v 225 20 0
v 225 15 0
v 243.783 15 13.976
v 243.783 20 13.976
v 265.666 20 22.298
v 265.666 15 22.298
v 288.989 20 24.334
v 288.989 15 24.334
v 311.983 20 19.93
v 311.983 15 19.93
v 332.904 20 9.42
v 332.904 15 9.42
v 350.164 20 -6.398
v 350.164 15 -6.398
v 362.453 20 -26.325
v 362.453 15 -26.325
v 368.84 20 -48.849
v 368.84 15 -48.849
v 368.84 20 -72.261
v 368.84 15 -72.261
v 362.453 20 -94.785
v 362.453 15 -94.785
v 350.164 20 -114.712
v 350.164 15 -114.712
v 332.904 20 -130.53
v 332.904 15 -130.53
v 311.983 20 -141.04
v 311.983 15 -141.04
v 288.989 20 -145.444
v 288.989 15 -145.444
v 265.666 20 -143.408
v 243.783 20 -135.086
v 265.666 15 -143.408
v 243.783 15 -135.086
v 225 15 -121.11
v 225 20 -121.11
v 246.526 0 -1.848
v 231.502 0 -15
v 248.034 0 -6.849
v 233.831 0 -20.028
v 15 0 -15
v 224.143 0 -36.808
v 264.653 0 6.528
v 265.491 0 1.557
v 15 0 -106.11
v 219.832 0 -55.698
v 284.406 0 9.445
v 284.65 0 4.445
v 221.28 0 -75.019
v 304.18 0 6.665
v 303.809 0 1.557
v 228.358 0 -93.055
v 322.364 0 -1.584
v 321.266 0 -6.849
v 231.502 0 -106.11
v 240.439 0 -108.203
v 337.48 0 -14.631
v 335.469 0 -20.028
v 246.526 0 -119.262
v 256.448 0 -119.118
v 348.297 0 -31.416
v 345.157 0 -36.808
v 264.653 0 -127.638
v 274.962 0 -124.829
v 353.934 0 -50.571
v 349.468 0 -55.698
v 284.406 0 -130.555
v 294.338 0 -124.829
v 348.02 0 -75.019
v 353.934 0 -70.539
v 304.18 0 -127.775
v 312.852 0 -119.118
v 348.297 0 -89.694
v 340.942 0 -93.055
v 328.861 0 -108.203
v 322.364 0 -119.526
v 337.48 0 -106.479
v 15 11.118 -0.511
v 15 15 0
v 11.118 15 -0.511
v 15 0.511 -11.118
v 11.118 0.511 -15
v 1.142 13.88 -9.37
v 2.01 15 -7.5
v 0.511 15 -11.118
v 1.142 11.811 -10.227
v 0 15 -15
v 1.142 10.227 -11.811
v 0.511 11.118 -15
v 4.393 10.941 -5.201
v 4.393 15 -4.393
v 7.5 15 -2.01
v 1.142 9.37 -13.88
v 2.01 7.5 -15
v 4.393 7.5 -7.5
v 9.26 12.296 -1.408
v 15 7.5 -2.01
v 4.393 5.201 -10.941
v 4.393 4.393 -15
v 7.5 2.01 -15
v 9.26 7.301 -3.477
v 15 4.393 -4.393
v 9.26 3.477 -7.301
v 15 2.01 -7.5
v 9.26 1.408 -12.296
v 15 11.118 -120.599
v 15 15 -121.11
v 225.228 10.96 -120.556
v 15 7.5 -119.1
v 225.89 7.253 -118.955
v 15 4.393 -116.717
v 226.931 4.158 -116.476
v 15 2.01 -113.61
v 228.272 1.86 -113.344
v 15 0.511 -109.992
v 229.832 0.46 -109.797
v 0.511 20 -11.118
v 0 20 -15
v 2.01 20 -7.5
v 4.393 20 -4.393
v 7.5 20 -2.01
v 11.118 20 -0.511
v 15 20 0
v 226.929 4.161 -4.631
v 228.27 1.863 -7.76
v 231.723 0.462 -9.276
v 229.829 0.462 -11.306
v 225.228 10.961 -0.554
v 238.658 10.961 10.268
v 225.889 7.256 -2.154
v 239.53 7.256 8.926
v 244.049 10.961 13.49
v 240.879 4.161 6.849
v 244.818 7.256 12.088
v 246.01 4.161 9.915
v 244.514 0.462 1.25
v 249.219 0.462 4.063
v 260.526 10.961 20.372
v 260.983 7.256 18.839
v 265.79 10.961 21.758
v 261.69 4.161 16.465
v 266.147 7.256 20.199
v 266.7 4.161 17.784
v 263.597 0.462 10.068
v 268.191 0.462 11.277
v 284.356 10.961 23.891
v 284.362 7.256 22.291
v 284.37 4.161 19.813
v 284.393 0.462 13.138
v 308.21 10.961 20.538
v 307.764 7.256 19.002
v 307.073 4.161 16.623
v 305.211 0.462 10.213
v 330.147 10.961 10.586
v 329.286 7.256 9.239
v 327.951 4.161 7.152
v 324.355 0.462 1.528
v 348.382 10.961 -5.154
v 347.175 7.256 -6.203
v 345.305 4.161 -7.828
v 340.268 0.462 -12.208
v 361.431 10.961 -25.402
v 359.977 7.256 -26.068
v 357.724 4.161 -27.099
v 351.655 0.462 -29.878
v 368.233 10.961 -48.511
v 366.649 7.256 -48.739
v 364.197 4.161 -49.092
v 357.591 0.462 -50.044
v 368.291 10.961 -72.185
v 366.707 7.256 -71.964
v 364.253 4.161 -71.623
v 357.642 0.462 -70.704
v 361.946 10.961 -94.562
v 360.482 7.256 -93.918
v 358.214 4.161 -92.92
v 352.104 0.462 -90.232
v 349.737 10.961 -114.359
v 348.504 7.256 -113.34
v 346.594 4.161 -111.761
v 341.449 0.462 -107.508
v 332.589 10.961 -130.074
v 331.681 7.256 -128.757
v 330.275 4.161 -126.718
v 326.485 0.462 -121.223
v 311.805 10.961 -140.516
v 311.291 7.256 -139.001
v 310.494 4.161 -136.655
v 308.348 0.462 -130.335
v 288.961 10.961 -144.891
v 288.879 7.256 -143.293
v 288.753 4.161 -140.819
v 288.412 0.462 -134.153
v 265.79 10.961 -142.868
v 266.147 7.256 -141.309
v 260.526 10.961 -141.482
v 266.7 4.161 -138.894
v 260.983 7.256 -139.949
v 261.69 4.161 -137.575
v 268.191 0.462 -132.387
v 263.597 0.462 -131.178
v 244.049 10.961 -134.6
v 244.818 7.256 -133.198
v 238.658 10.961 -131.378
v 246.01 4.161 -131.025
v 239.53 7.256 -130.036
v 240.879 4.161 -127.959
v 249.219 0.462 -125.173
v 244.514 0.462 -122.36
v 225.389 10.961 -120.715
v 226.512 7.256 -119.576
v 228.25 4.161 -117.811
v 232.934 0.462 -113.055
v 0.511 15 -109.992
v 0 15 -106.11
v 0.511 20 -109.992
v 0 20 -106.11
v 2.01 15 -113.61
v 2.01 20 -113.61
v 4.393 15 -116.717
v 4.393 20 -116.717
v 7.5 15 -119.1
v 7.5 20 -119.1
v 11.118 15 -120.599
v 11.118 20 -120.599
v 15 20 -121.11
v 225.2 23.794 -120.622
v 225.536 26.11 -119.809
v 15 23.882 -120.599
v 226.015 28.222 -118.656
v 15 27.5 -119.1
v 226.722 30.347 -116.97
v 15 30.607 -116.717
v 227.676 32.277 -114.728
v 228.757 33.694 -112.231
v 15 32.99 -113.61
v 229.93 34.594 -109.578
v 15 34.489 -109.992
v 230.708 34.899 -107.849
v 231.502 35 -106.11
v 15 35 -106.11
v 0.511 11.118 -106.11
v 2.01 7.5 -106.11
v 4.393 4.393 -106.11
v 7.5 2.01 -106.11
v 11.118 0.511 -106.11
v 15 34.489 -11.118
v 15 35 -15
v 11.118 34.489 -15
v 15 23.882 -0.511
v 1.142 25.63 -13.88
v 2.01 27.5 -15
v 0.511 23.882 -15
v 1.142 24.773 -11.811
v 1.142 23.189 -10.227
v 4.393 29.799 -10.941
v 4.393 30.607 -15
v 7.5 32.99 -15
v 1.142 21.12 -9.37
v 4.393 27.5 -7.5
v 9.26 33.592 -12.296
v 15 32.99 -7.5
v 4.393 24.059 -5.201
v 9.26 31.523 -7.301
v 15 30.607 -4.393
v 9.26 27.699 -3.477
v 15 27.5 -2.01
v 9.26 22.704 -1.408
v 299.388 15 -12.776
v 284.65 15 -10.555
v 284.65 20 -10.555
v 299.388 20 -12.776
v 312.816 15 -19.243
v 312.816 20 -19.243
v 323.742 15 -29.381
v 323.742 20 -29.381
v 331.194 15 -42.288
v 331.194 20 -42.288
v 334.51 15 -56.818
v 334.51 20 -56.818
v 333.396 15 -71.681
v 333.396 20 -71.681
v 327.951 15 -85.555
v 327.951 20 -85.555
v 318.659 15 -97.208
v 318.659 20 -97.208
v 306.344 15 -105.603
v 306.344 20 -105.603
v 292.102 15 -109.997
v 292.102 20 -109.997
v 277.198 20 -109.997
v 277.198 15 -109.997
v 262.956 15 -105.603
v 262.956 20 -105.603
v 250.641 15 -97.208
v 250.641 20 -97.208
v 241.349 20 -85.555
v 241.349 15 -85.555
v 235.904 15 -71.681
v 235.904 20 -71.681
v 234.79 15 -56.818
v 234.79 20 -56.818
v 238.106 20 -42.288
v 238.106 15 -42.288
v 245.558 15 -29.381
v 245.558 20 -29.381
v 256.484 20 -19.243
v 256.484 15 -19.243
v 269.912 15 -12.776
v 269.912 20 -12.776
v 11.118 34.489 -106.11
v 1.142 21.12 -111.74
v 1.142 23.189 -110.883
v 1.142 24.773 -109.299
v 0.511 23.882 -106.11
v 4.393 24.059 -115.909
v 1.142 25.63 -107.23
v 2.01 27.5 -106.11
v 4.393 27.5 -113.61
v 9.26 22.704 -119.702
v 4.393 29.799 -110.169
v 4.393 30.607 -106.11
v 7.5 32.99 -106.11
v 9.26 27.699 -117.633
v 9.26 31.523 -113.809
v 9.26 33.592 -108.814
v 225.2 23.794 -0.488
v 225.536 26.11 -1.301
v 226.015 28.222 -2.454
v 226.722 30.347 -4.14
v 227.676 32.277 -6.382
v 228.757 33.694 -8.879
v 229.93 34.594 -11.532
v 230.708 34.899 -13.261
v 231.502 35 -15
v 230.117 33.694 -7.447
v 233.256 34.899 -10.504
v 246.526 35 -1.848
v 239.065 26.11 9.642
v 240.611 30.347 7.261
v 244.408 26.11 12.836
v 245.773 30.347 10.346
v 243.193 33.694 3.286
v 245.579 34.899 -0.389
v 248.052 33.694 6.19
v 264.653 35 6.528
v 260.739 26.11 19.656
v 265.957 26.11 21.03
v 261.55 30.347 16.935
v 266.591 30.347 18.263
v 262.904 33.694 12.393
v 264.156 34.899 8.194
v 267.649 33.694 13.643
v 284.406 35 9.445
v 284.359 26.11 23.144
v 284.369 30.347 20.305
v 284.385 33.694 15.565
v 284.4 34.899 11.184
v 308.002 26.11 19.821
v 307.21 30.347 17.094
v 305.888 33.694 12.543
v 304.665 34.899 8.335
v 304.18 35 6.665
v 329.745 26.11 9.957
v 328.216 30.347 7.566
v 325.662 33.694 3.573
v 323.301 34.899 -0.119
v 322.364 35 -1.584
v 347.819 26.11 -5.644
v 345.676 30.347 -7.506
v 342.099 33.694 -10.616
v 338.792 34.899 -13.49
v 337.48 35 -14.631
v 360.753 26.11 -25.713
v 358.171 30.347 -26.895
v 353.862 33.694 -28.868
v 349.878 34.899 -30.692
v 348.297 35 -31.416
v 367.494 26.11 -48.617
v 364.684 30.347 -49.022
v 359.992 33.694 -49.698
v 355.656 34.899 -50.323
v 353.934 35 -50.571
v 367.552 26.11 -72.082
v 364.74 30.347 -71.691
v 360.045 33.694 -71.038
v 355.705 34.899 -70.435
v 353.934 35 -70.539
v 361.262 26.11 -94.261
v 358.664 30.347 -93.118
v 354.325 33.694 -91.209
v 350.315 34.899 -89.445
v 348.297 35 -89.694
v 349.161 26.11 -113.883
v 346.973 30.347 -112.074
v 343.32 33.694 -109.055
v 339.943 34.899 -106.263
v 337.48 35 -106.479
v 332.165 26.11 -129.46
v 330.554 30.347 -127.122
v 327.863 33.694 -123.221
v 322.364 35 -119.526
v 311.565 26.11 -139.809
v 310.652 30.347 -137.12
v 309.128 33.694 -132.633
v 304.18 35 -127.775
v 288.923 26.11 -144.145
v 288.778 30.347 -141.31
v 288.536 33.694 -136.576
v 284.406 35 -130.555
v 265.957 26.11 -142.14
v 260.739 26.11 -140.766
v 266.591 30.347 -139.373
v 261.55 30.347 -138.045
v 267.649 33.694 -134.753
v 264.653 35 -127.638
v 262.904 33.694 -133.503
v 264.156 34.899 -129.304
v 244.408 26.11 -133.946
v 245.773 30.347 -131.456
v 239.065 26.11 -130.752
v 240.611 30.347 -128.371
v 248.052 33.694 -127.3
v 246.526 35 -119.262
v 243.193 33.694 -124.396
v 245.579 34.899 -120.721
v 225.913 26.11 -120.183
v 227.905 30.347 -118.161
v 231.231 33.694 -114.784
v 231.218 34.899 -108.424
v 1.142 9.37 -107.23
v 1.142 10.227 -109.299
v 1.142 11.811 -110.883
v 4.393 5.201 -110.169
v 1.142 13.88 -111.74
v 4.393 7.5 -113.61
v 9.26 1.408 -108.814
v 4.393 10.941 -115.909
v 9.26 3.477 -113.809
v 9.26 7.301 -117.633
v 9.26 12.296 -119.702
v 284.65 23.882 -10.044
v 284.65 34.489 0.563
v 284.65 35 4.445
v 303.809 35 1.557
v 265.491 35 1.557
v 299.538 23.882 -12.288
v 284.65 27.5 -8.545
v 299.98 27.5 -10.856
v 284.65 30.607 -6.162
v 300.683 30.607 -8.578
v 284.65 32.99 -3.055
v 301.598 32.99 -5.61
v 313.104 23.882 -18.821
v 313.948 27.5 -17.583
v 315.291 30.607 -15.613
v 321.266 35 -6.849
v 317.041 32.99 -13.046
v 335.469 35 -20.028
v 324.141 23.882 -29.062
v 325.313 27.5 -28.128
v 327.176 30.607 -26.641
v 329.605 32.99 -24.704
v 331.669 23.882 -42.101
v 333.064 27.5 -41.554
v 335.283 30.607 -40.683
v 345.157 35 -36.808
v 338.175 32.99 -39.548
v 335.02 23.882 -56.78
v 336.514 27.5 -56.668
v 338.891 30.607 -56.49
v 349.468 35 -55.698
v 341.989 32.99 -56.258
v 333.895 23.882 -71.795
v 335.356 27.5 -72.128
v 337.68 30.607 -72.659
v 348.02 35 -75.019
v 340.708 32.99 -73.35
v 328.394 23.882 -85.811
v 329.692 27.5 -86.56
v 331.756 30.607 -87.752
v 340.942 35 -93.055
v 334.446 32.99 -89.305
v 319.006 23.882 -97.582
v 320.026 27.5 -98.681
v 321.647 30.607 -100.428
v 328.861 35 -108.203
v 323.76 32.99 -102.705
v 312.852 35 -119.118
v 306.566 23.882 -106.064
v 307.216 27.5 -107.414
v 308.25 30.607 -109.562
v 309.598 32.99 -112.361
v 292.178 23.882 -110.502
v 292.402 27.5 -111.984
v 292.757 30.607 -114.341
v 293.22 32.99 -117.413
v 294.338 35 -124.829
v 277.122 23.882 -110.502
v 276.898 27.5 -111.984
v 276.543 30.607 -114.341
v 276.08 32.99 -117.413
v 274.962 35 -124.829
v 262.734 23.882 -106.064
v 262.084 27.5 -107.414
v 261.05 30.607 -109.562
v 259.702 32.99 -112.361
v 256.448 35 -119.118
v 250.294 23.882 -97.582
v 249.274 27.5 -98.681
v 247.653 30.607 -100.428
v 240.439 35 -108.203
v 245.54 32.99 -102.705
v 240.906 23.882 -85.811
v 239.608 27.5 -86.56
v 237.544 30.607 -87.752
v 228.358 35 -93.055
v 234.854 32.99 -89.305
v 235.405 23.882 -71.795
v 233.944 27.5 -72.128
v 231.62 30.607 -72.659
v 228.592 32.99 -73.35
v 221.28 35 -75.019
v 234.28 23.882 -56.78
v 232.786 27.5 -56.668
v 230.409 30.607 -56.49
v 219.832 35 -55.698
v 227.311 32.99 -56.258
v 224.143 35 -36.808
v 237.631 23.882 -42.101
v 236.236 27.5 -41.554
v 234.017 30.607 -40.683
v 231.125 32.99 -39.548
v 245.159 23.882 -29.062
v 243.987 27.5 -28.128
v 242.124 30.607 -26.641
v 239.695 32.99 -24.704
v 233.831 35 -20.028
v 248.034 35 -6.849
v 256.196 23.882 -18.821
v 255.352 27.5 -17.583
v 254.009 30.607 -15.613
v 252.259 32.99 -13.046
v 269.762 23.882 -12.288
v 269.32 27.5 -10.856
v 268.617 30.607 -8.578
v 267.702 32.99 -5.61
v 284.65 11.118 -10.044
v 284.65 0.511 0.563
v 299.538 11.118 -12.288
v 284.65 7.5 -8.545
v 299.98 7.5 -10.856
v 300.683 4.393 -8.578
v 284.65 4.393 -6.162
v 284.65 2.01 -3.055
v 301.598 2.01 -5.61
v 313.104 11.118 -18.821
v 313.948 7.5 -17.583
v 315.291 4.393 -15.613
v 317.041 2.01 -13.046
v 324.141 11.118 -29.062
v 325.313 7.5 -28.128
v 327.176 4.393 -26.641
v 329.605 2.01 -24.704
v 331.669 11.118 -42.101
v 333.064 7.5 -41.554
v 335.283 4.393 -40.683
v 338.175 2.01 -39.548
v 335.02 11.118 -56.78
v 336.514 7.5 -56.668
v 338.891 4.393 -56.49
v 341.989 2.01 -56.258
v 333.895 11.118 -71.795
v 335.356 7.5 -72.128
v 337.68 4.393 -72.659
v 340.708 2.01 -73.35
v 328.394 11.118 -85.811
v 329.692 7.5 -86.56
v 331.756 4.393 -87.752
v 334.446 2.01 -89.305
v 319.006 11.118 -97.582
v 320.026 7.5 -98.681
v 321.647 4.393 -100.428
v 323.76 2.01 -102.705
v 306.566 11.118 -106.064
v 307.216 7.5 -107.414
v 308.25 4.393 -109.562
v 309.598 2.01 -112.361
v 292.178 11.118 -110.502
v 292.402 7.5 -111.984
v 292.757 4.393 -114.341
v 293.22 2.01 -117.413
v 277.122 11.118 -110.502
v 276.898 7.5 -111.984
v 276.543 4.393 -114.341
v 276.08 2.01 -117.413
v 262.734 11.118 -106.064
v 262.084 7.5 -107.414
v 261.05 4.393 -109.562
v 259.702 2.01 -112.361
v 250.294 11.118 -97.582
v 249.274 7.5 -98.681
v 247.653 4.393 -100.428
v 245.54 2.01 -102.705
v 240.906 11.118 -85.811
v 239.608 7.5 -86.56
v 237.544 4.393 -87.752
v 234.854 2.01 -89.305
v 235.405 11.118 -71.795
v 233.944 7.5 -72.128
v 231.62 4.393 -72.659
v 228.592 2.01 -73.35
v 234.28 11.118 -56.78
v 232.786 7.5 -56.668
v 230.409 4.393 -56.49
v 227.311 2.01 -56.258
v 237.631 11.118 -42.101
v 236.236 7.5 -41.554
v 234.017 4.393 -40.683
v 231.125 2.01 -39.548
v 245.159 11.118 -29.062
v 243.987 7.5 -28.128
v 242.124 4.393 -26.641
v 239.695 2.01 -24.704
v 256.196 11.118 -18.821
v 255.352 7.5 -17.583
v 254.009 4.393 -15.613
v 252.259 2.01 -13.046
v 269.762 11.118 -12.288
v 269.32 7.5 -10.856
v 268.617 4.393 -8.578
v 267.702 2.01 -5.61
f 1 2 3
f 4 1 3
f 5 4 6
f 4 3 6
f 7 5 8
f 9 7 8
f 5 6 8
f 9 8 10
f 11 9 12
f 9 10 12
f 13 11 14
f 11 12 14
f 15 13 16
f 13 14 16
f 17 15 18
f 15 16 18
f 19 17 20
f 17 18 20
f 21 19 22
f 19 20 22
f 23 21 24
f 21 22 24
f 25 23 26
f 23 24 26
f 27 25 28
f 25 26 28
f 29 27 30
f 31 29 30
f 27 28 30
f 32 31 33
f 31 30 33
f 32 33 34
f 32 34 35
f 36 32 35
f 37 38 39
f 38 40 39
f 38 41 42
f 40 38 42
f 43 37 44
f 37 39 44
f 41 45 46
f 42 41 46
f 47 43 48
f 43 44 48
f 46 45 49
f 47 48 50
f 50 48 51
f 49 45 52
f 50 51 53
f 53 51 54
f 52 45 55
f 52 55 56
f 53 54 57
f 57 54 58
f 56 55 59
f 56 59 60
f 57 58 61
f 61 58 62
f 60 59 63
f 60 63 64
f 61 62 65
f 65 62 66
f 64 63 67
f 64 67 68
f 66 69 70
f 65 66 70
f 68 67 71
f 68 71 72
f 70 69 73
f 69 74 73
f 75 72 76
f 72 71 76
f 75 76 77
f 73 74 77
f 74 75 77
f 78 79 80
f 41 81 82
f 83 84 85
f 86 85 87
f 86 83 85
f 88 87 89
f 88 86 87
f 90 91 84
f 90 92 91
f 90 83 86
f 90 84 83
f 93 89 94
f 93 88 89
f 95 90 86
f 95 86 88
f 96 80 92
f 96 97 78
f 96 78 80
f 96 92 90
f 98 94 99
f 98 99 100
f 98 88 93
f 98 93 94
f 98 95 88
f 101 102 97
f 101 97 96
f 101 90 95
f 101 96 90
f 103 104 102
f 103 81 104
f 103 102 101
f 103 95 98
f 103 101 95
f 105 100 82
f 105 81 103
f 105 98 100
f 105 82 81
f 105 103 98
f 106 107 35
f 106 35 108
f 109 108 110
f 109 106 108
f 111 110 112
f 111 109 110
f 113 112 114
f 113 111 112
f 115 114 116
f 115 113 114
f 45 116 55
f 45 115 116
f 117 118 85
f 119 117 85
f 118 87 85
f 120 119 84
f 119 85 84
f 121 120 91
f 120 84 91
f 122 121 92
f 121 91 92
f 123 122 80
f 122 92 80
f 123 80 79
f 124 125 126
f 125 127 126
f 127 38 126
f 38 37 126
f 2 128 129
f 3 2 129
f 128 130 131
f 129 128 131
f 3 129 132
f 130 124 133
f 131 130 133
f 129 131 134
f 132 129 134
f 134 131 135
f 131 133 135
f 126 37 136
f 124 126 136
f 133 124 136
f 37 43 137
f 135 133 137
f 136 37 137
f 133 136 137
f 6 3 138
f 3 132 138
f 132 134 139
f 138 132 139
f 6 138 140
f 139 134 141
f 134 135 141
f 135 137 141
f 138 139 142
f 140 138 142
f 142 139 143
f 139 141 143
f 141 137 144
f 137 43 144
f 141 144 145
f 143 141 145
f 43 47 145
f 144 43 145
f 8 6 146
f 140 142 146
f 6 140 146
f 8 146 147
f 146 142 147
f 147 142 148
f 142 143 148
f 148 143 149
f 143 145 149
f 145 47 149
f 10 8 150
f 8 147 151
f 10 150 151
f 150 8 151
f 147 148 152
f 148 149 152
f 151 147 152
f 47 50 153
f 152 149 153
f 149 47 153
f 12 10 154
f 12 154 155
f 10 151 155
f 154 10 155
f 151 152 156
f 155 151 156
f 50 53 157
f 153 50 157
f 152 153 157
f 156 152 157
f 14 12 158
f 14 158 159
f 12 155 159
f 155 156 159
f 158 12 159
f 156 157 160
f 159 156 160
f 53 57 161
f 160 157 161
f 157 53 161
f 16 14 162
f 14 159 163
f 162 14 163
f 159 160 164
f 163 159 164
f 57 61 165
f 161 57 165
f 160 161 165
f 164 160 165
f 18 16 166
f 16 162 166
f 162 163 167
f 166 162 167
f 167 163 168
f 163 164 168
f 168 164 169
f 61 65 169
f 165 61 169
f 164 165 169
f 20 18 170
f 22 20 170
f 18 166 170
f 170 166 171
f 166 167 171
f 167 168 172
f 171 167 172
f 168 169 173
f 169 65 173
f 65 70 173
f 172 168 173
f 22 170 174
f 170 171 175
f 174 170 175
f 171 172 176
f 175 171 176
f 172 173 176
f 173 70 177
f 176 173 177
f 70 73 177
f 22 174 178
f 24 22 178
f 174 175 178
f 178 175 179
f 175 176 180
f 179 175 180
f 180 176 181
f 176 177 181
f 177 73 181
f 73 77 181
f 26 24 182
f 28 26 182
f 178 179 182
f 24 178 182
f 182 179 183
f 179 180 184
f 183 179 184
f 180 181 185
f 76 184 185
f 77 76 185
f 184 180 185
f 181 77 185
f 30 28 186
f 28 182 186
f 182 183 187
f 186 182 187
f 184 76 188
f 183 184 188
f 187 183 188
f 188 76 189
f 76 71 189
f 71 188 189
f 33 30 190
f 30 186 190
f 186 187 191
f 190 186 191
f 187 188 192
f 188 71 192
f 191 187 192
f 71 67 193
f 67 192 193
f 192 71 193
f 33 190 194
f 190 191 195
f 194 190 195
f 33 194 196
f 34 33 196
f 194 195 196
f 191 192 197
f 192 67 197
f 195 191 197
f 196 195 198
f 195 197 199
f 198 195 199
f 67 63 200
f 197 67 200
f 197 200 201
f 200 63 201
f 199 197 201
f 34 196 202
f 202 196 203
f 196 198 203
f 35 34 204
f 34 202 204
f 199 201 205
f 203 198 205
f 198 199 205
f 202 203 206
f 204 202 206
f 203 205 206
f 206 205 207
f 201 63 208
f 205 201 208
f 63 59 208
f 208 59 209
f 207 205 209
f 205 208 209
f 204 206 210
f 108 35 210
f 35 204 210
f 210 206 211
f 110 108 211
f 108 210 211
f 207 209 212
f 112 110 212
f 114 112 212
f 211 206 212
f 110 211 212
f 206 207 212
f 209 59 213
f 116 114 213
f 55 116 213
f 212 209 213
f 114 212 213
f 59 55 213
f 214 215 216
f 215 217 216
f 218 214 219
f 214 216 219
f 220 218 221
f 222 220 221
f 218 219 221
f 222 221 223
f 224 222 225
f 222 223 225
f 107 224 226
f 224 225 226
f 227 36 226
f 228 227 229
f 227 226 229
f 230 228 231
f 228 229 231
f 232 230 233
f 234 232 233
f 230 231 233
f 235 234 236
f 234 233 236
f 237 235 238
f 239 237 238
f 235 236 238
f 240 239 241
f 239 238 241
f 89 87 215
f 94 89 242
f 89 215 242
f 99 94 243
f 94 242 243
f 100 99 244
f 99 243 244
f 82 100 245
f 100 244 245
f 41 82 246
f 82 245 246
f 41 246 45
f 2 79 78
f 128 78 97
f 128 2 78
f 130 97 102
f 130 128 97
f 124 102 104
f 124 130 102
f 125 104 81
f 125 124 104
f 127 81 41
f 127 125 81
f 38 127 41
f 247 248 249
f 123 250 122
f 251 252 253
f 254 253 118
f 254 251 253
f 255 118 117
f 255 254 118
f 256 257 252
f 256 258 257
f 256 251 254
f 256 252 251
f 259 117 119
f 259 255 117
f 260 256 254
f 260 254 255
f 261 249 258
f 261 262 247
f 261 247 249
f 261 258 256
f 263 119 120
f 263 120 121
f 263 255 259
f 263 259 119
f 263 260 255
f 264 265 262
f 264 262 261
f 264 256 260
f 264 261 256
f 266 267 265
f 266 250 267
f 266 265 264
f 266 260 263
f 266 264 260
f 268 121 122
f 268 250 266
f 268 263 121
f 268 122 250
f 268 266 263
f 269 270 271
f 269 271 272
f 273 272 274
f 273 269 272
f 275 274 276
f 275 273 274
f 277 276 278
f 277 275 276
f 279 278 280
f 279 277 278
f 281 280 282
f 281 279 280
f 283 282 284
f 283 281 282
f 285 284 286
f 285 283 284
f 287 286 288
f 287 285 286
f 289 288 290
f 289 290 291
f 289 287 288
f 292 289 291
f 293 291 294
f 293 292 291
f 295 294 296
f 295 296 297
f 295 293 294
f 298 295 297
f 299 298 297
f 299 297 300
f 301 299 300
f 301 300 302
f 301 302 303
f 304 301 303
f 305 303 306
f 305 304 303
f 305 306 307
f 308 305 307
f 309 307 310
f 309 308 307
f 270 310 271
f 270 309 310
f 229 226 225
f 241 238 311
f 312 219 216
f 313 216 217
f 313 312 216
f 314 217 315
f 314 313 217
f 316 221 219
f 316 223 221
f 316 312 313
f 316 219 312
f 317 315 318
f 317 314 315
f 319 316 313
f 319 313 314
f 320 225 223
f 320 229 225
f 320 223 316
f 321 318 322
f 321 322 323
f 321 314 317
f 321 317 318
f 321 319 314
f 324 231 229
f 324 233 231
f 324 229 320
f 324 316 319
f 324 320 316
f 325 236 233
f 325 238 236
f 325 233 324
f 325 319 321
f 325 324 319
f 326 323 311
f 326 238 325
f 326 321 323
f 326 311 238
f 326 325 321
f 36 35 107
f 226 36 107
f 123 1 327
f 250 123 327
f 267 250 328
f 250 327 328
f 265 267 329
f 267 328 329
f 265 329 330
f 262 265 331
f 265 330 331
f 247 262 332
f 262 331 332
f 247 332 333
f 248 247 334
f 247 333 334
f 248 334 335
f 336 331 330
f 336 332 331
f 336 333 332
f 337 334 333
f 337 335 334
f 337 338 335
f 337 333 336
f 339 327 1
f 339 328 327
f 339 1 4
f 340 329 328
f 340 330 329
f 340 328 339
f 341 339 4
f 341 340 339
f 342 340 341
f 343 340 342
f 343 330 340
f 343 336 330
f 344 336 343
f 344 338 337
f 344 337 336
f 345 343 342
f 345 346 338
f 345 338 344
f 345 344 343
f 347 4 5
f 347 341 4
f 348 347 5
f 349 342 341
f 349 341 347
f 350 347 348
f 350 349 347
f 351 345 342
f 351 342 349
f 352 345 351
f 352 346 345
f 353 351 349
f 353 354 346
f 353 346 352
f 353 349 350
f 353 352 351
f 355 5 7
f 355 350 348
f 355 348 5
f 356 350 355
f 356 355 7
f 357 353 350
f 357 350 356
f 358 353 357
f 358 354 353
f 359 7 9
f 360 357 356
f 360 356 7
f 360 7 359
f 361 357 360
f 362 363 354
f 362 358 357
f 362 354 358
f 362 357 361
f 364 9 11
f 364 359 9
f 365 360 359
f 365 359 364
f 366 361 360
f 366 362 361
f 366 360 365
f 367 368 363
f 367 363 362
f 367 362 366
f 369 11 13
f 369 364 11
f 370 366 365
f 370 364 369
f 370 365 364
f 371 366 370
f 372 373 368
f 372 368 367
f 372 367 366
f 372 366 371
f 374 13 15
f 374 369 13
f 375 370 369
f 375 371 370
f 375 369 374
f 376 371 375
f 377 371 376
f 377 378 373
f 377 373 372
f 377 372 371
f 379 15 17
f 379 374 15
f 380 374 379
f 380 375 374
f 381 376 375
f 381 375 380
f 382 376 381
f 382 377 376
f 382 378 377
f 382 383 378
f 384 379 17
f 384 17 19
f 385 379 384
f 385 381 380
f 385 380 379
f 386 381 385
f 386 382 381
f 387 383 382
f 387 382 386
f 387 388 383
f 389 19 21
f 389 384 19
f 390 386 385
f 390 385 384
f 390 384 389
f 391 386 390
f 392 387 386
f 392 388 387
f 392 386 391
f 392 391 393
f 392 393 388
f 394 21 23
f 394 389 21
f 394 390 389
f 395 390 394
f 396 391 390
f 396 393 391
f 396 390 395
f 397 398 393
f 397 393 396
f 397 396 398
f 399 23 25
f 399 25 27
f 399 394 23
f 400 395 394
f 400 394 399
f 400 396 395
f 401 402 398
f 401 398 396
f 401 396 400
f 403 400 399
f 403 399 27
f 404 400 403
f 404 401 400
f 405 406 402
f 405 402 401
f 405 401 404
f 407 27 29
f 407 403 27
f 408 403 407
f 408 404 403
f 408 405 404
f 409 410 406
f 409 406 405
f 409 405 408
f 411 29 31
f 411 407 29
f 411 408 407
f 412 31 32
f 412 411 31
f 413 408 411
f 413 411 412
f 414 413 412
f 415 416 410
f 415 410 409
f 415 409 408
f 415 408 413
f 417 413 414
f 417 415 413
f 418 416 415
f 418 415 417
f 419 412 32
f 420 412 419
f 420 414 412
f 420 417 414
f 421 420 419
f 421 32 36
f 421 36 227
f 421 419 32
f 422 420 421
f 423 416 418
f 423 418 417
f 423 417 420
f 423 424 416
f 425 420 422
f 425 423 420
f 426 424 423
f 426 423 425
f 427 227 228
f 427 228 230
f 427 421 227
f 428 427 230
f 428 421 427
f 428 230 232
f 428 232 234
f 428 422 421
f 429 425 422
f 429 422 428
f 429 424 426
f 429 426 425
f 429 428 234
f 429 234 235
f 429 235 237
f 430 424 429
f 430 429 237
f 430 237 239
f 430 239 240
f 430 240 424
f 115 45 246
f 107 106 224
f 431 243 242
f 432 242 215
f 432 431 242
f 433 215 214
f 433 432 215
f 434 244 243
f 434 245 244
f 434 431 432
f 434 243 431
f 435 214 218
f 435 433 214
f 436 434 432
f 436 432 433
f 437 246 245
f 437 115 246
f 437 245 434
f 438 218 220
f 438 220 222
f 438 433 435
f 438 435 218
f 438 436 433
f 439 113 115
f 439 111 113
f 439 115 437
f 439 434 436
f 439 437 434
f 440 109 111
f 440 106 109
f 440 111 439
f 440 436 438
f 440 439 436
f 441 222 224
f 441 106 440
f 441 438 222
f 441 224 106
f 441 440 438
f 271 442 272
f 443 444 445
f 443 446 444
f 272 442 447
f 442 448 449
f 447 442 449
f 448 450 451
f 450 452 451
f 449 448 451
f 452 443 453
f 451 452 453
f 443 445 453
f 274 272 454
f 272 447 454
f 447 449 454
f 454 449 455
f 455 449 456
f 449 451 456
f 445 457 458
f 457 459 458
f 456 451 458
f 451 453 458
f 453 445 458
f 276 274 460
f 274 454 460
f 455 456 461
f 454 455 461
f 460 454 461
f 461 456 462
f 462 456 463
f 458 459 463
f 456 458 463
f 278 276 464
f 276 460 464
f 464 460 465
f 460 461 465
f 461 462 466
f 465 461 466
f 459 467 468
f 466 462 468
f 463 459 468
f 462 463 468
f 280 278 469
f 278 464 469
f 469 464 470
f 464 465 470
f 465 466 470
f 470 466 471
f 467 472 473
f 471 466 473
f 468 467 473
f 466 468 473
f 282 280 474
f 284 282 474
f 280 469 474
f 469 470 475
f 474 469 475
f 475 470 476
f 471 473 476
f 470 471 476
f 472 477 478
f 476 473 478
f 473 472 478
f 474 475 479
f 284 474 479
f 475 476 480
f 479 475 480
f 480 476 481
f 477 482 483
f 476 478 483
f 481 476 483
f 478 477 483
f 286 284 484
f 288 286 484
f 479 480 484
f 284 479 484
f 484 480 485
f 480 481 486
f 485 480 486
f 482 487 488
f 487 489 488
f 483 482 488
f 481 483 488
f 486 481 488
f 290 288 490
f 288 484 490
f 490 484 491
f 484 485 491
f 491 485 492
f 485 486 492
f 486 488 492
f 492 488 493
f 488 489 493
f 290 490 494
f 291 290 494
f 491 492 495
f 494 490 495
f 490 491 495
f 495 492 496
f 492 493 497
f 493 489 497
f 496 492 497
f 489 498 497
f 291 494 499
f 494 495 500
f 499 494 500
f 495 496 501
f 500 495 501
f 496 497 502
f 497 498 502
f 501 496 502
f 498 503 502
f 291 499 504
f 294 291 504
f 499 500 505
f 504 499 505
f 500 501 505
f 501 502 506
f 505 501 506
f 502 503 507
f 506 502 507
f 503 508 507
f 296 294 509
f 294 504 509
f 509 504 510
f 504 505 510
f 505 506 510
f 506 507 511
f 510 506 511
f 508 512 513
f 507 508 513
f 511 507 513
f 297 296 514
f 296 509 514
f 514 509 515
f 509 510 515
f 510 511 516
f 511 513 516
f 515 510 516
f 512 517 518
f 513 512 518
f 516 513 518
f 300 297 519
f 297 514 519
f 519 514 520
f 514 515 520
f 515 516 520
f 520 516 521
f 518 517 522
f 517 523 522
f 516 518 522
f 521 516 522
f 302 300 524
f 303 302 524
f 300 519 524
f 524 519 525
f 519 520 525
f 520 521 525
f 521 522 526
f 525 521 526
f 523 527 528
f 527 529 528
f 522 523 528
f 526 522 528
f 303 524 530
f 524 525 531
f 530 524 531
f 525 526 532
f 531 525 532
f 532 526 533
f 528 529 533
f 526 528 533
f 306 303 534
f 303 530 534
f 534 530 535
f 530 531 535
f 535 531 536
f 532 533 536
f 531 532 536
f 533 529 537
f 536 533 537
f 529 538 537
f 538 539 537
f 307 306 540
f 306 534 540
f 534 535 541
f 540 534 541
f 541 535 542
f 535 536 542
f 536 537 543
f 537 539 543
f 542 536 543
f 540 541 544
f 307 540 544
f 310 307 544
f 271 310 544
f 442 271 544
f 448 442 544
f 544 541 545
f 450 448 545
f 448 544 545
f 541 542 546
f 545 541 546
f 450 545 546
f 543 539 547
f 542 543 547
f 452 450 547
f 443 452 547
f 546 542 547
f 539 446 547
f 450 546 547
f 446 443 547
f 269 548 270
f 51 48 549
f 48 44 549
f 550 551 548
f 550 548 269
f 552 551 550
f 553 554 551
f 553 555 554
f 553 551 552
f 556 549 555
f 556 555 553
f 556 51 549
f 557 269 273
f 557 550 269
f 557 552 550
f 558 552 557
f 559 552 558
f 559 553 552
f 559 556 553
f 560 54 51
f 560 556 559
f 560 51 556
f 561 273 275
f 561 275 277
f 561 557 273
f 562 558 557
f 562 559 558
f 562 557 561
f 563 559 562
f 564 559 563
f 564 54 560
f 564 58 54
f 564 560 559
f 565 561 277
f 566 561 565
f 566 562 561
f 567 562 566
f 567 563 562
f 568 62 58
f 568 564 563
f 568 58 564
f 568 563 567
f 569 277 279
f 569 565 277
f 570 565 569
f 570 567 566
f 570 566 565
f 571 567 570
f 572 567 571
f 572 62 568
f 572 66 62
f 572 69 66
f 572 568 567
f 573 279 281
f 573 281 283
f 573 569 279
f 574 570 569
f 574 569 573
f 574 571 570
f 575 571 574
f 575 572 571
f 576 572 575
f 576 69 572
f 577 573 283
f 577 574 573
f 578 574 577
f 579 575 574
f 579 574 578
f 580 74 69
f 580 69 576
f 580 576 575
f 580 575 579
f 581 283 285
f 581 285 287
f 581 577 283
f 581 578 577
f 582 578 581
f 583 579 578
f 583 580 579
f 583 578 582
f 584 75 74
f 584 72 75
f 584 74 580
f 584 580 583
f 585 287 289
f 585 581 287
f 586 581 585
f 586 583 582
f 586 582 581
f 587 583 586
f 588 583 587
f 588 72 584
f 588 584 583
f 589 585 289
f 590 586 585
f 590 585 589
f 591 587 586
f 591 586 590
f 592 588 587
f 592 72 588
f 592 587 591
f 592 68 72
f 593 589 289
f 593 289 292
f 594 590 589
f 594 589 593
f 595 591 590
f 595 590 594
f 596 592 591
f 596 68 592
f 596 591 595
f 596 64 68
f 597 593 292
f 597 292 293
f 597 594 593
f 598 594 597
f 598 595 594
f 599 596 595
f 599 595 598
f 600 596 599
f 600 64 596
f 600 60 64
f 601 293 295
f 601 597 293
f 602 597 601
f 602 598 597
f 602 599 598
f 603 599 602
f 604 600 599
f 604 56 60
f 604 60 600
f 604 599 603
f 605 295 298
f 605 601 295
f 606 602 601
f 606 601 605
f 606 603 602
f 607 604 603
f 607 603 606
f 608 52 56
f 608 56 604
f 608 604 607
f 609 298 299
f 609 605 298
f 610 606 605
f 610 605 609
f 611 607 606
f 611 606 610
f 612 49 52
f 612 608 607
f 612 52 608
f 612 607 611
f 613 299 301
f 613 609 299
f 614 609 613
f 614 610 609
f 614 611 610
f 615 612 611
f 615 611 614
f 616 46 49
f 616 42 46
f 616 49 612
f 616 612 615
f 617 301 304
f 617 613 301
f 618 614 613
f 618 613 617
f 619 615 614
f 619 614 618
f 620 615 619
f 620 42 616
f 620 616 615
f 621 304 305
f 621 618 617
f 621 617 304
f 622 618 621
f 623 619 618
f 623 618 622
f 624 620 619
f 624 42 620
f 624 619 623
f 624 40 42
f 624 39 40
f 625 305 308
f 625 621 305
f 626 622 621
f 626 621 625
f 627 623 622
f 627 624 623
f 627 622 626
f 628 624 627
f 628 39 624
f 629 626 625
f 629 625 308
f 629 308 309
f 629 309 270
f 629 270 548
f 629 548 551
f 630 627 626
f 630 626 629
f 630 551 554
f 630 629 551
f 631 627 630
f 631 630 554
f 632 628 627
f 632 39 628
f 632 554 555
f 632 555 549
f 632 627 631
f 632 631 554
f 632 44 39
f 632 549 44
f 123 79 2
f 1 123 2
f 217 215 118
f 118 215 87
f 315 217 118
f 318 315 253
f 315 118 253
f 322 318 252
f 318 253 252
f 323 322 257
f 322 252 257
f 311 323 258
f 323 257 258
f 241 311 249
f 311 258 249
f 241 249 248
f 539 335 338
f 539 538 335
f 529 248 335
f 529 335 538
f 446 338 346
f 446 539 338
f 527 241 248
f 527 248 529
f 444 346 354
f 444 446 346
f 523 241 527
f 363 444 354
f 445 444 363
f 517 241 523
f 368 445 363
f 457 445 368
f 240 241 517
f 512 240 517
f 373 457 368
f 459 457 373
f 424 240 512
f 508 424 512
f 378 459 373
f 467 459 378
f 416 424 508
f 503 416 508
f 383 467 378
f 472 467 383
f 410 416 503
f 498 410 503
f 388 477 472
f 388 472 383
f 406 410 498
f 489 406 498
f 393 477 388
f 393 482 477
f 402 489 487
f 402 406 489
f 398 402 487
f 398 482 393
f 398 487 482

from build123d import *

# Parameters (mm, degrees)
SKETCH1_R      = 50
EXTRUDE1_DEPTH = 35
FILLET1_R      = 15
FILLET2_R      = 15


with BuildPart() as part:
    # Sketch1 → Extrude1 (new body)
    with BuildSketch(Plane(origin=(0, 0, 0), x_dir=(1, 0, 0), z_dir=(0, 1, 0))):
        with BuildLine():
            Line((0, 0), (225.000255868, 0))
            ThreePointArc((225.000255868, 0), (369.65, 60.555), (225.000255868, 121.11))
            Line((225.000255868, 121.11), (0, 121.11))
            Line((0, 121.11), (0, 0))
        make_face()
        with Locations(Location((284.65, 60.555, 0), (0, 0, 270))):
            Circle(SKETCH1_R, mode=Mode.SUBTRACT)
    extrude(amount=EXTRUDE1_DEPTH)

    # Fillet1
    fillet1_edges = [part.edges().sort_by_distance(p)[0] for p in [
        (369.65, 35, -60.555),
        (284.65, 0, -110.555),
        (284.65, 35, -110.555),
        (112.500127934, 35, -121.11),
        (112.500127934, 0, -121.11),
        (369.65, 0, -60.555),
        (112.500127934, 0, 0),
        (112.500127934, 35, 0),
    ]]
    fillet(fillet1_edges, radius=FILLET1_R)

    # Fillet2
    fillet2_edges = [part.edges().sort_by_distance(p)[0] for p in [
        (0, 17.5, -121.11),
        (0, 0, -60.555),
        (0, 17.5, 0),
        (0, 35, -60.555),
        (0, 30.606601718, -4.393398282),
        (0, 4.393398282, -4.393398282),
        (0, 30.606601718, -116.716601718),
        (0, 4.393398282, -116.716601718),
    ]]
    fillet(fillet2_edges, radius=FILLET2_R)


solid = part.part
